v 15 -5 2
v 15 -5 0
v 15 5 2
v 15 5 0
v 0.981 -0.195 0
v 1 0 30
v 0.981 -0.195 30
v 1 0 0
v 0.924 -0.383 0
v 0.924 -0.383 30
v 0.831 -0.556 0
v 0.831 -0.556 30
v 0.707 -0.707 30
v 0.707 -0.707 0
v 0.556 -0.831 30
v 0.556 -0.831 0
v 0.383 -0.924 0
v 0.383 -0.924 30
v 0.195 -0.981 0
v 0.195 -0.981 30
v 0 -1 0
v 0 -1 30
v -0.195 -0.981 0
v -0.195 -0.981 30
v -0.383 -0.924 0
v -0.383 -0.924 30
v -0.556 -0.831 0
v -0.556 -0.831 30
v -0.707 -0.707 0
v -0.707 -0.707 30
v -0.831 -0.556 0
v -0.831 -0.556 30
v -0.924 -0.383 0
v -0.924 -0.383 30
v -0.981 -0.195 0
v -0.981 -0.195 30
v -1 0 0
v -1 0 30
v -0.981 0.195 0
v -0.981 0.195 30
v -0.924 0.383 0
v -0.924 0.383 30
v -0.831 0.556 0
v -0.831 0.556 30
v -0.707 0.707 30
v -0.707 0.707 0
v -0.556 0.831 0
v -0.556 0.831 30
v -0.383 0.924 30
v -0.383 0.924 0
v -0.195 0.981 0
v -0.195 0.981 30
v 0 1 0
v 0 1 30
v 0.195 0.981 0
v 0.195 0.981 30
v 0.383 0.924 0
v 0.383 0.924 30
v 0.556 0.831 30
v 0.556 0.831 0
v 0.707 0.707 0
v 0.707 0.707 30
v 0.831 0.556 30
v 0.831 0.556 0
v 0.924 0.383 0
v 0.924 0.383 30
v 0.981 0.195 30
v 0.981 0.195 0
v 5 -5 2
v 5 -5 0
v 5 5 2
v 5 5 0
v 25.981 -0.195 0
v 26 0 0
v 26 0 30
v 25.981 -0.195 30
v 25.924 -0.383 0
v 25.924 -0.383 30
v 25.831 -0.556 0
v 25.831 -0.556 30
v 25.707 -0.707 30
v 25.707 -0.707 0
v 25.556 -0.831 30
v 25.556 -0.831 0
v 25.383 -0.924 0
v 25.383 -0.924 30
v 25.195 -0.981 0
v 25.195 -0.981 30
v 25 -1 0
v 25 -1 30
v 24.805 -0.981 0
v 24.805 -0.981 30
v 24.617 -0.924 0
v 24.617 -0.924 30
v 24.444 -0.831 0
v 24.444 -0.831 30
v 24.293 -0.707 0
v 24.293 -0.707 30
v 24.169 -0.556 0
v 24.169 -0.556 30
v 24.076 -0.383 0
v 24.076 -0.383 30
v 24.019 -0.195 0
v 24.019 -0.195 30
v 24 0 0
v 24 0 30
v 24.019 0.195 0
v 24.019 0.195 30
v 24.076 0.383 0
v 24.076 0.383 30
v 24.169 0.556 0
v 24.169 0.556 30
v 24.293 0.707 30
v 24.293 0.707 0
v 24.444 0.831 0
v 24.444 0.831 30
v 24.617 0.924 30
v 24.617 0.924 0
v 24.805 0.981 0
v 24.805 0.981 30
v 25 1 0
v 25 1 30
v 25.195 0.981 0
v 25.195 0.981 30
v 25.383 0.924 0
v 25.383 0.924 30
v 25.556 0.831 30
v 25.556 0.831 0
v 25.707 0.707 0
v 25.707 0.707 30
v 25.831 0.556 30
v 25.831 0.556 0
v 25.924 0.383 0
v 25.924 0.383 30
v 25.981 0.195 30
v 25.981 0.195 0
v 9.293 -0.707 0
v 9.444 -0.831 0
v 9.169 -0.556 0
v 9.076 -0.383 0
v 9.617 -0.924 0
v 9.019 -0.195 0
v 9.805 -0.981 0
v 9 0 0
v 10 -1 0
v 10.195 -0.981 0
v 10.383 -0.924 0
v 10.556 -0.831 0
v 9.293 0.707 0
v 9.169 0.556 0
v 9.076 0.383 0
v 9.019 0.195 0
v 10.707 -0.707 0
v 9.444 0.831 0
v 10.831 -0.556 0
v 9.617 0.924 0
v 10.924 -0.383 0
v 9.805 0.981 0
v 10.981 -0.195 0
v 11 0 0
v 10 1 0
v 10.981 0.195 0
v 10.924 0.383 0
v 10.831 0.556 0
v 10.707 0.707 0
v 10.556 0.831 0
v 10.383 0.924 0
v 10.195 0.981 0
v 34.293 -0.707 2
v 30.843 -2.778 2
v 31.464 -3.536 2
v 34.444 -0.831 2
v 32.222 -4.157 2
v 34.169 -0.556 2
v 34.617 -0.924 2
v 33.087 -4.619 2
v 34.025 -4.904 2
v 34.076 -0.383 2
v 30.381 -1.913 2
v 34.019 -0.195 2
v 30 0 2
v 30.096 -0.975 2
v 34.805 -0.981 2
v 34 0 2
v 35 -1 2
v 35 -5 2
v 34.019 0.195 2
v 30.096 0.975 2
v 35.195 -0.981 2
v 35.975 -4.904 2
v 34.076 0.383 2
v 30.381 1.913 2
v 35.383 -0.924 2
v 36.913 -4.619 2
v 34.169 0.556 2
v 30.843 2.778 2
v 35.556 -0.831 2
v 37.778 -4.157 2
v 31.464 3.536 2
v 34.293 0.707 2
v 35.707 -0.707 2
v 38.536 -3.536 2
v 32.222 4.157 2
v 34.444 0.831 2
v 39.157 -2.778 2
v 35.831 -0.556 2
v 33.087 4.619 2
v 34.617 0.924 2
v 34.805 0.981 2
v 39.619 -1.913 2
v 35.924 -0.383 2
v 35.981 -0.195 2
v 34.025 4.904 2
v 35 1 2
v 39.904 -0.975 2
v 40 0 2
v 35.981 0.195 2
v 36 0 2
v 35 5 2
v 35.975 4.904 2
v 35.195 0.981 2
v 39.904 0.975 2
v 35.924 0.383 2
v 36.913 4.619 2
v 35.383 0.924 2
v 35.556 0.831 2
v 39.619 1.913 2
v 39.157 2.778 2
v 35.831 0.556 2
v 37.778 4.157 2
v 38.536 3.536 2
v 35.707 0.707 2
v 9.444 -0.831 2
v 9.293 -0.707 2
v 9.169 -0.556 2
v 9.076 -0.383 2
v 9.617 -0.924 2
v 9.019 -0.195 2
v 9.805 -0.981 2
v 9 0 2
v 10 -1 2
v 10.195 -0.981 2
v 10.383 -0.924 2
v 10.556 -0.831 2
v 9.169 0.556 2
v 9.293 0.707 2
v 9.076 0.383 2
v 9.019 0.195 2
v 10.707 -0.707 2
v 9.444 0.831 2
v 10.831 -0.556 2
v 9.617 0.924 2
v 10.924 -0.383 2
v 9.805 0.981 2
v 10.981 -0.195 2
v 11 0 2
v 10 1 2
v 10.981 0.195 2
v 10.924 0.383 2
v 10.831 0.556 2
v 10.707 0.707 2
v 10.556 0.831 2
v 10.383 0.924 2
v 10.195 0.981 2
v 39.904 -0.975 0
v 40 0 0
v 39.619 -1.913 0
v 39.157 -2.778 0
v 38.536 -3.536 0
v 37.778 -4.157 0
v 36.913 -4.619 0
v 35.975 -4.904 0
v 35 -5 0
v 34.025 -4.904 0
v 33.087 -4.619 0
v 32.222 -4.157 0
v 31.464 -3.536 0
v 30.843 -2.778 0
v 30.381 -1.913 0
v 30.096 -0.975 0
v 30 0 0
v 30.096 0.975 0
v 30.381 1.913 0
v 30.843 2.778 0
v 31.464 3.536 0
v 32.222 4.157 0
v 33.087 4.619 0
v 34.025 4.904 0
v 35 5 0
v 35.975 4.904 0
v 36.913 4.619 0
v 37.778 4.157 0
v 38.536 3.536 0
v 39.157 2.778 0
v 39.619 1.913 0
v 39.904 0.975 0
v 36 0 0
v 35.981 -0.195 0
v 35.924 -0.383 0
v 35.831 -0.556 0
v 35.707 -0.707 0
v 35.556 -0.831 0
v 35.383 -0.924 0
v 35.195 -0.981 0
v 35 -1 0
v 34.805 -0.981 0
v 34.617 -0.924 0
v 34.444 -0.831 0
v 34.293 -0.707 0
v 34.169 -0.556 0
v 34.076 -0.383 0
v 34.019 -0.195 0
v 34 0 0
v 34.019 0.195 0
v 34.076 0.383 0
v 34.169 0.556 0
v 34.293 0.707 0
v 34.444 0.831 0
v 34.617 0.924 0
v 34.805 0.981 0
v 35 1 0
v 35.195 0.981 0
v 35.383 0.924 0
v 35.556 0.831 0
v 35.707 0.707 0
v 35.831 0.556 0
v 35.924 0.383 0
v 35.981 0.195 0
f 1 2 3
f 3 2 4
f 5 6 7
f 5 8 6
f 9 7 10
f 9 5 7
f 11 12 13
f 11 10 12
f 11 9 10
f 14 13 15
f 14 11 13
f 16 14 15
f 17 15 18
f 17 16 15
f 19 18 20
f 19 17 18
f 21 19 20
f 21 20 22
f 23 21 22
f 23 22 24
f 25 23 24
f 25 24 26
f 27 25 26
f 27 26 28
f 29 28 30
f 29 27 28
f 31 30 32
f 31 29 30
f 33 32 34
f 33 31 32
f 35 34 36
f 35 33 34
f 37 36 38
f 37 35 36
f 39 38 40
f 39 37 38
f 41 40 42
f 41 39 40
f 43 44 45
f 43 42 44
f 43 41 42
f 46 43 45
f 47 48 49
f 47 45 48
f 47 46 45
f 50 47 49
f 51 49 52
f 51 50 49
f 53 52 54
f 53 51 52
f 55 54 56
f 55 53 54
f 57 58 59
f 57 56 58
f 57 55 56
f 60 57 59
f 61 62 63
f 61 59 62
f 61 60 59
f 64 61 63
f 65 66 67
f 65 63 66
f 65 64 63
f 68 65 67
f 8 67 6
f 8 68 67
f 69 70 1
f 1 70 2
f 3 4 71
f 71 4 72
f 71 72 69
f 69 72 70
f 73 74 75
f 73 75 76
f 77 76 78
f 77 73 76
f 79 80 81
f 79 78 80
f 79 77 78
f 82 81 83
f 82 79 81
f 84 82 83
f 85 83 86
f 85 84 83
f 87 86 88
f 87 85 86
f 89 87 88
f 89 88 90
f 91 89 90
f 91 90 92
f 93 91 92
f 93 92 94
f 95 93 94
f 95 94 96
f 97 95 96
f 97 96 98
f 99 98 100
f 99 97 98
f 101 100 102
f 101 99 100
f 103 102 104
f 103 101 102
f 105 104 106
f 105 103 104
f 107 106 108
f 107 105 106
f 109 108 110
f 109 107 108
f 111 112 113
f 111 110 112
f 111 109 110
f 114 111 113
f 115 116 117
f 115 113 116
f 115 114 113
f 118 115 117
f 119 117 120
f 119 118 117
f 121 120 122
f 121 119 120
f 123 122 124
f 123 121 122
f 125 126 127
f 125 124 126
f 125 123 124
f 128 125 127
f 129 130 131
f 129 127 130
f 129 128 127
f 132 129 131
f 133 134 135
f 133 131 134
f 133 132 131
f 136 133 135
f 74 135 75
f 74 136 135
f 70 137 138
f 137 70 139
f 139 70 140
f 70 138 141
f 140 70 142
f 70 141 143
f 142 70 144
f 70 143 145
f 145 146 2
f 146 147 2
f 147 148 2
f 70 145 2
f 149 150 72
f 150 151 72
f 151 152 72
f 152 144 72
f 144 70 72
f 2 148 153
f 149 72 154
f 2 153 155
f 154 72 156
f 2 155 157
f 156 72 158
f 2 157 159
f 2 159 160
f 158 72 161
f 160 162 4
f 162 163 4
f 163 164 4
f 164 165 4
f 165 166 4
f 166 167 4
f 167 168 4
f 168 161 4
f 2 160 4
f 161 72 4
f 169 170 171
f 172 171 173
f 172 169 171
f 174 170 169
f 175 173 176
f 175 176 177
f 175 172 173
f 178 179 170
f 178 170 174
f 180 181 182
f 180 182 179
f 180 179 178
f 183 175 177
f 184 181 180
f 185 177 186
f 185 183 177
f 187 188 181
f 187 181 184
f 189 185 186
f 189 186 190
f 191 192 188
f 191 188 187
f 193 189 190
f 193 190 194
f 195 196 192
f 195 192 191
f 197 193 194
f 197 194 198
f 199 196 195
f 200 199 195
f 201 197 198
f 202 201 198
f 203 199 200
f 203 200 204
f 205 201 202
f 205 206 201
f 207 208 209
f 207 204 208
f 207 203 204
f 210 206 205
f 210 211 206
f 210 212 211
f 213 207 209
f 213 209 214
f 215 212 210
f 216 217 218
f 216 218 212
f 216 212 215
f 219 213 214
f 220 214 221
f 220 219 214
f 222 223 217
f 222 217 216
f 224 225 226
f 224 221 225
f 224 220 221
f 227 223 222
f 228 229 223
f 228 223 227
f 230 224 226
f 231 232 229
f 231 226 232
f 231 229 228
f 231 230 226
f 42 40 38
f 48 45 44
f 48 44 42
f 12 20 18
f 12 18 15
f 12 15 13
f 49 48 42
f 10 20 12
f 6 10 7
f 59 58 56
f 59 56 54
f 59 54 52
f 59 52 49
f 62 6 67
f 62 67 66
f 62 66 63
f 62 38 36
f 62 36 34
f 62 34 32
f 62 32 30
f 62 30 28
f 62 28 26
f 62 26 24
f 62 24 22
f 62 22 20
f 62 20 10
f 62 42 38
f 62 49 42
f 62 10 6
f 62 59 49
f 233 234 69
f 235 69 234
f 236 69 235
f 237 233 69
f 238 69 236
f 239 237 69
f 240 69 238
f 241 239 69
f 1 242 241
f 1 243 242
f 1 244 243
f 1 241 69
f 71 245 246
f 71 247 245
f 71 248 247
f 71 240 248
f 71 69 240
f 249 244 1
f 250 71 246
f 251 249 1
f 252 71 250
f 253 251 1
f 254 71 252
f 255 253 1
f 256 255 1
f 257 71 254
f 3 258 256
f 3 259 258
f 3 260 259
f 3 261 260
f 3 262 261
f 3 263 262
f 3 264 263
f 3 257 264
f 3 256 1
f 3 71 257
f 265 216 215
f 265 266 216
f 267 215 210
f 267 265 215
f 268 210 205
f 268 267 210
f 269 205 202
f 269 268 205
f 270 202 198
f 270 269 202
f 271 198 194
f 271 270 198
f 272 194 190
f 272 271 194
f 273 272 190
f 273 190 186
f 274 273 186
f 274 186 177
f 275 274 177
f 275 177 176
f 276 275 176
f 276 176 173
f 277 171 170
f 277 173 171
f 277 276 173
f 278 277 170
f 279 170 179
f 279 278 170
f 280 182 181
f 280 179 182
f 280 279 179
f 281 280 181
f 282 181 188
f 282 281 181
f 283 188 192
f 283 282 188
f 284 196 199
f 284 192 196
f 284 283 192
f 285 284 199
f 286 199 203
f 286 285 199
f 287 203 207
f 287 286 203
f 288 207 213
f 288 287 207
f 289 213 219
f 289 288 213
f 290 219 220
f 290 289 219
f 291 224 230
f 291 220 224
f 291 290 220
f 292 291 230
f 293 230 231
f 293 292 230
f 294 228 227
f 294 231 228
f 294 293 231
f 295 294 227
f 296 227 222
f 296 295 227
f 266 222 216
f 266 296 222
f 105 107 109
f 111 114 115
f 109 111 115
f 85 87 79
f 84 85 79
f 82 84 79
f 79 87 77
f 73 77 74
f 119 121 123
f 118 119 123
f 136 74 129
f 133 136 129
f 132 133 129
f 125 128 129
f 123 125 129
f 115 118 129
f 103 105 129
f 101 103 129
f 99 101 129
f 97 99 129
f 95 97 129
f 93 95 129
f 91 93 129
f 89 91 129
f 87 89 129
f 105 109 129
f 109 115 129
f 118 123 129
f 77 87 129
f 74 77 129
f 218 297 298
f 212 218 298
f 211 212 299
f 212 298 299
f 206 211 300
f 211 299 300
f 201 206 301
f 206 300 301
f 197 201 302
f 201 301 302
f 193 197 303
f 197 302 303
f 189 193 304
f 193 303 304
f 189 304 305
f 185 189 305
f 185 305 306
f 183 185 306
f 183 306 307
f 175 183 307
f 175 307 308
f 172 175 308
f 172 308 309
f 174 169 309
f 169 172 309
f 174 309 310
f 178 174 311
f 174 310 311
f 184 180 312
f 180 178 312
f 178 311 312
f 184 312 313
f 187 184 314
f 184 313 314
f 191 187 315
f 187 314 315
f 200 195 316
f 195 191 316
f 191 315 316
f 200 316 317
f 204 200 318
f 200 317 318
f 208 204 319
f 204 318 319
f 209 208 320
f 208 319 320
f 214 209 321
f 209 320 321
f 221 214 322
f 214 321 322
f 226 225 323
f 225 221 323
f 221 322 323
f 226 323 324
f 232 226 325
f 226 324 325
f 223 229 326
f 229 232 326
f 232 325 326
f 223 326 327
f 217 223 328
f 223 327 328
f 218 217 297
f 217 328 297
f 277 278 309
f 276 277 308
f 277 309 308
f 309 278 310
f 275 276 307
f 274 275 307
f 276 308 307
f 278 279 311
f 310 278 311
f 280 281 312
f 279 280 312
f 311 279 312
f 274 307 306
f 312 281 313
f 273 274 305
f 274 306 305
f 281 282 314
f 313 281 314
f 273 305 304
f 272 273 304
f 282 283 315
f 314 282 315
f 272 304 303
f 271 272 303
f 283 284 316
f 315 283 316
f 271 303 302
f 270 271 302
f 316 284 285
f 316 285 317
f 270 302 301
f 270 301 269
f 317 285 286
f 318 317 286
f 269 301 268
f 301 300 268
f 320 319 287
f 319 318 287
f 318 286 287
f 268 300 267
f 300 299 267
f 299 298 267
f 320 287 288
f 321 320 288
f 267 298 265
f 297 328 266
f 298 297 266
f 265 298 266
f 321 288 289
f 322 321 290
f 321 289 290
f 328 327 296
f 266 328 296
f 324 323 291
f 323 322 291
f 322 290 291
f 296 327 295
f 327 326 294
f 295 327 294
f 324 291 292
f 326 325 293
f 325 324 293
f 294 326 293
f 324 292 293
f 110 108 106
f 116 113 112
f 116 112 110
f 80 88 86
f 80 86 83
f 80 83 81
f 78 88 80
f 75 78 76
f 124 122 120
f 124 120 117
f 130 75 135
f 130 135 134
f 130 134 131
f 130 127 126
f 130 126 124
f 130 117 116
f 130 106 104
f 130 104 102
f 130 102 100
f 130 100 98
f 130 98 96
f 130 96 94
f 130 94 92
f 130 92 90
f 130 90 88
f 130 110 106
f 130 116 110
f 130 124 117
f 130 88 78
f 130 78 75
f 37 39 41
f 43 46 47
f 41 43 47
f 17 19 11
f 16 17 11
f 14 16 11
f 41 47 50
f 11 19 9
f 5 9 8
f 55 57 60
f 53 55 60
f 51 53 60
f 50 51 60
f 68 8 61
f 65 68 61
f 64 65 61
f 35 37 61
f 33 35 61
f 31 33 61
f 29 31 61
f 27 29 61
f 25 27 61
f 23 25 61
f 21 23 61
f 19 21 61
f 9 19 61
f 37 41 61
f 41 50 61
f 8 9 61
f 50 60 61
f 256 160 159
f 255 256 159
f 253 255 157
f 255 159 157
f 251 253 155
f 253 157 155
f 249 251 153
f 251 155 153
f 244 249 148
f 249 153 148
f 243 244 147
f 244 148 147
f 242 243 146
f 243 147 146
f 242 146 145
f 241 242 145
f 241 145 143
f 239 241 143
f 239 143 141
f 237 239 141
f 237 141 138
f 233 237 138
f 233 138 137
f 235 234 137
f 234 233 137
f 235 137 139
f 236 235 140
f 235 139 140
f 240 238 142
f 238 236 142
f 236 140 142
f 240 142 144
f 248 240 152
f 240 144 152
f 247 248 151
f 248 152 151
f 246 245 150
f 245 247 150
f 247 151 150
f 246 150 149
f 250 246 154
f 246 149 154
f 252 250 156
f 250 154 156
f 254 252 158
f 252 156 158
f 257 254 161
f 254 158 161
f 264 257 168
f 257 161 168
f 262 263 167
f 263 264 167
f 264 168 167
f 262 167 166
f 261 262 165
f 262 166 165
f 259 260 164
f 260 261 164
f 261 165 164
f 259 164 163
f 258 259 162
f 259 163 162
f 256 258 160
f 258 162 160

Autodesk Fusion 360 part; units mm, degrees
sketch "スケッチ1" plane through (0, 0, 0) normal (0, 0, 1) x (1, 0, 0)
  circle A0 centre (0, 0) radius 1
  circle A1 centre (35, 0) radius 5
  circle A2 centre (35, 0) radius 1
  line L0 (15, 5) -> (5, 5)
  line L1 (5, 5) -> (5, -5)
  line L2 (5, -5) -> (15, -5)
  line L3 (15, -5) -> (15, 5)
  line L4 (15, 5) -> (5, -5) construction
  line L5 (5, 5) -> (15, -5) construction
  circle A3 centre (10, 0) radius 1
  point P0 (10, 0)
extrude "押し出し1" add sketch "スケッチ1" along normal blind 2 contours A1 makes body 1 in component "円盤"
extrude "押し出し1'" add sketch "スケッチ1" along normal blind 30 separate body contours A0 makes body 2 in component "軸"
extrude "押し出し1''" add sketch "スケッチ1" along normal blind 2 separate body contours L0 L1 L2 L3 makes body 3 in component "四角"
component "円盤" placed x (1, 0, 0) y (0, 1, 0) z (0, 0, 1) at (0, 0, 0)
component "軸" placed x (1, 0, 0) y (0, 1, 0) z (0, 0, 1) at (0, 0, 0)
component "四角" placed x (1, 0, 0) y (0, 1, 0) z (0, 0, 1) at (0, 0, 0)
component "軸" placed x (1, 0, 0) y (0, 1, 0) z (0, 0, 1) at (25, 0, 0)
